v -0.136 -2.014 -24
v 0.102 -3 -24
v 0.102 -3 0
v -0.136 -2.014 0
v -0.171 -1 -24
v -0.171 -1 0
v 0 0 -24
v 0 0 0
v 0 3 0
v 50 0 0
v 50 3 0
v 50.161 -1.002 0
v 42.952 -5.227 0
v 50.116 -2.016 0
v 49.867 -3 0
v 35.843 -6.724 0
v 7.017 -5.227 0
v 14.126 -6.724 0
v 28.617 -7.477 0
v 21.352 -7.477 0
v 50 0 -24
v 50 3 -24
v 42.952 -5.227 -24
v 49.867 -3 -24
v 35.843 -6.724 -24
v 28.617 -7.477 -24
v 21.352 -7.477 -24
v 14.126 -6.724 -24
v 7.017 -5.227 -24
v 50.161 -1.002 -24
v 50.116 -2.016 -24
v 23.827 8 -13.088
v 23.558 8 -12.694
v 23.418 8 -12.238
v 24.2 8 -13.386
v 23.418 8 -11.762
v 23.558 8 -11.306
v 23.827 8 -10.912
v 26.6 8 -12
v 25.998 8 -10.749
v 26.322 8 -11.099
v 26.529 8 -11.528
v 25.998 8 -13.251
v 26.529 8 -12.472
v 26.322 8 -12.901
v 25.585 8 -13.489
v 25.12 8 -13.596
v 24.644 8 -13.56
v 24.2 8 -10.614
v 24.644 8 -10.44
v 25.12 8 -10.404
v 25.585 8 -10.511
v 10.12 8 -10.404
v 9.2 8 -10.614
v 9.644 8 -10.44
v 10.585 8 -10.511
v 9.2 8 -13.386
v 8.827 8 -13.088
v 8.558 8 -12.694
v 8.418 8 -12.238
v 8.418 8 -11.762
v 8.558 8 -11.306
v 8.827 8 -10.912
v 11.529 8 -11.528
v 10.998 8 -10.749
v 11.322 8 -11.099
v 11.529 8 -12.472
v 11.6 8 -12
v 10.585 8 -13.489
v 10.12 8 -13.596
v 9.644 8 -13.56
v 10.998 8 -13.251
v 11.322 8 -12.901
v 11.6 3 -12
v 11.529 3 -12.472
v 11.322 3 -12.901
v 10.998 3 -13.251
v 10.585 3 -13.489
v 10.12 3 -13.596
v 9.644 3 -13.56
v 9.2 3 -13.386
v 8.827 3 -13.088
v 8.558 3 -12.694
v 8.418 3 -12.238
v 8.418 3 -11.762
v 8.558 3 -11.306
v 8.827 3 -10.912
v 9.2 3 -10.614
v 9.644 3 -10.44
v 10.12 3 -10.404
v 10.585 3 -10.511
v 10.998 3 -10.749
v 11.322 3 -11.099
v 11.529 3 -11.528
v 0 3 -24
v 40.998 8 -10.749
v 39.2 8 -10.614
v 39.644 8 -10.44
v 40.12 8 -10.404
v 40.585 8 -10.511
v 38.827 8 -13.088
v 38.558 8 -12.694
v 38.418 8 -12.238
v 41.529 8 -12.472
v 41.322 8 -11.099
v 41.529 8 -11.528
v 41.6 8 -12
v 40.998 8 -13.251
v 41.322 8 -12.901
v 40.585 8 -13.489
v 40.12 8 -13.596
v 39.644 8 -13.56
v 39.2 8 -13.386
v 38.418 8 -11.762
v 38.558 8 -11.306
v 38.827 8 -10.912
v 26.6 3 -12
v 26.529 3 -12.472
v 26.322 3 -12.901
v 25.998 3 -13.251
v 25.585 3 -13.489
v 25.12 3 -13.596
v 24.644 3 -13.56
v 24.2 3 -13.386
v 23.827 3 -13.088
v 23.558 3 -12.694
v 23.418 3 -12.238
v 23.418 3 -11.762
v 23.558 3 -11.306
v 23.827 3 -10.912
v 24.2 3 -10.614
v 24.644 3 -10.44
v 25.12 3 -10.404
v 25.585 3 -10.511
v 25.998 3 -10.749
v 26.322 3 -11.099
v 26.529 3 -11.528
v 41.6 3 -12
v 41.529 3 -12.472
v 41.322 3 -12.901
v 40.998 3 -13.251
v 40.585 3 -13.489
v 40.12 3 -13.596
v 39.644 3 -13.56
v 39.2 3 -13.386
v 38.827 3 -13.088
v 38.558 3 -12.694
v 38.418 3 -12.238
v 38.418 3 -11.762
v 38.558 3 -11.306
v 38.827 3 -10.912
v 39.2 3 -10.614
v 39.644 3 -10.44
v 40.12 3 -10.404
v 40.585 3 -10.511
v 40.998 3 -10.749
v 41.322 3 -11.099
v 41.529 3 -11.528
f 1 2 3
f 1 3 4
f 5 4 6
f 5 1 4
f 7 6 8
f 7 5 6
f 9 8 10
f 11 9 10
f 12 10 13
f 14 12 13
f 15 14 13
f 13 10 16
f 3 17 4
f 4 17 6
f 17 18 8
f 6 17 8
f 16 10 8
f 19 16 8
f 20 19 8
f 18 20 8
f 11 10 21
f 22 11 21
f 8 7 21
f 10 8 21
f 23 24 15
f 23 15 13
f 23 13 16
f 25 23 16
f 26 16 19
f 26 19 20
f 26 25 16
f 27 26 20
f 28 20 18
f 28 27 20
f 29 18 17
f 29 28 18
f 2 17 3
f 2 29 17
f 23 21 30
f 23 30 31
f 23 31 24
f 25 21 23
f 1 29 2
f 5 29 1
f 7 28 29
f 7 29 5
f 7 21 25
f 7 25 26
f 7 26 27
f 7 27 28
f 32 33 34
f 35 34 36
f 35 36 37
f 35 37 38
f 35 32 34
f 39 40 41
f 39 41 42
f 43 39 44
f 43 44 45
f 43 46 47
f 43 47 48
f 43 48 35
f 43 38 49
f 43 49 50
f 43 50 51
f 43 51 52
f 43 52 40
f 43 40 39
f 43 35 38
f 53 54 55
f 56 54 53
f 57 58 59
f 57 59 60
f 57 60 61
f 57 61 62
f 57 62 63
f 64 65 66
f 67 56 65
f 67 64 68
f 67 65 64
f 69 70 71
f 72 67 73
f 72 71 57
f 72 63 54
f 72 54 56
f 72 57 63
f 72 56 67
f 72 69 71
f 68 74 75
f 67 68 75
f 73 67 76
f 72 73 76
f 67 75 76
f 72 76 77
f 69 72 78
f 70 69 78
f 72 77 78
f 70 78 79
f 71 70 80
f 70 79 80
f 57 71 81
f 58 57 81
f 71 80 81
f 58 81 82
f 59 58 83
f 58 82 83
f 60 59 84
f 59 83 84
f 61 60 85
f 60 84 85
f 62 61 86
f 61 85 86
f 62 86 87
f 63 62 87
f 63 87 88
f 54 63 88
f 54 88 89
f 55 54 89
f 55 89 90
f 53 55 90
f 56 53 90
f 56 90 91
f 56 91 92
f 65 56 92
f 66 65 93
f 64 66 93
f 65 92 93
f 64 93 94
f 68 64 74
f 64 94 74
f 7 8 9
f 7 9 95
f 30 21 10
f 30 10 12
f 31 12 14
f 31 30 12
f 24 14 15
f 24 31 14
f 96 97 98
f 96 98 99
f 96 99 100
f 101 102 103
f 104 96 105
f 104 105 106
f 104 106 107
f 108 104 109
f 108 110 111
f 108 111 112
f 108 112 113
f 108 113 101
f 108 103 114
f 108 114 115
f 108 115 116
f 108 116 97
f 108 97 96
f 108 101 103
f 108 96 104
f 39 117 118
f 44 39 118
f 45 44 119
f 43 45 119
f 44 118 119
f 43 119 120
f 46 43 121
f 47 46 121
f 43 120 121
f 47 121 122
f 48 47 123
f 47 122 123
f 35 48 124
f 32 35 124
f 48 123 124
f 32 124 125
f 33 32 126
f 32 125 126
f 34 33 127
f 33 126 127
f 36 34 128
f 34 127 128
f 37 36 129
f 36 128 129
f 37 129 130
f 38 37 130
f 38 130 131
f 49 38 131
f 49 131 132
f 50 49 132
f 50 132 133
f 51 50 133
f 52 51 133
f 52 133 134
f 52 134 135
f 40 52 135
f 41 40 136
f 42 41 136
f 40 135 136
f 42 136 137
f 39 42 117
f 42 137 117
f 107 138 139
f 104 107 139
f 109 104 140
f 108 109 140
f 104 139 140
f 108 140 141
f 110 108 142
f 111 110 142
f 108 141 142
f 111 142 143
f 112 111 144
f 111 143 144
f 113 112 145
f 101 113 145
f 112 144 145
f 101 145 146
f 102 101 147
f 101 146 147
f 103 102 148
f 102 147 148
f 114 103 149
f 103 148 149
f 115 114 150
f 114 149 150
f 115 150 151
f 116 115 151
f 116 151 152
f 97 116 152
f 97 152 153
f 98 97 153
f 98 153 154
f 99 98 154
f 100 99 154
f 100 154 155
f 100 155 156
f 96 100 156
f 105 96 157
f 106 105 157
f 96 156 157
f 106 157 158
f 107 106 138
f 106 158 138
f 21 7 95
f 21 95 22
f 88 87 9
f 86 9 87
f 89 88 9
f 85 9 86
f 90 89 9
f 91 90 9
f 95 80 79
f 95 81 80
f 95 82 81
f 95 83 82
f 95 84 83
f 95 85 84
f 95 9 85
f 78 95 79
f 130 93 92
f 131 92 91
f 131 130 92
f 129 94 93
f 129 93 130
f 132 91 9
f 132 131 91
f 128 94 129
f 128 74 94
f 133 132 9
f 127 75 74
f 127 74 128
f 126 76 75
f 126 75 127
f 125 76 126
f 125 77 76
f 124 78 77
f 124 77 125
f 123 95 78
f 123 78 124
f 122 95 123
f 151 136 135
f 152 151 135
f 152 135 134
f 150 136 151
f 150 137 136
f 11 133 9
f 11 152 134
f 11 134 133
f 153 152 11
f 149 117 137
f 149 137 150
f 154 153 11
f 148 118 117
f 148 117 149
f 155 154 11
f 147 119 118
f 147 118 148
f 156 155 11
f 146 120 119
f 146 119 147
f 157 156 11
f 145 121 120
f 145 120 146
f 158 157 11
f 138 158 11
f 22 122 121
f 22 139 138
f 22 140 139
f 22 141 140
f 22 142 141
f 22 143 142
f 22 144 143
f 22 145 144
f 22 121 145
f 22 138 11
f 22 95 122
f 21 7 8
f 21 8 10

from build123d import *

# Parameters (mm, degrees)
SKETCH1_W           = 50
SKETCH1_H           = 24
BOSS_EXTRUDE1_DEPTH = 3
SKETCH2_R           = 1.6
BOSS_EXTRUDE2_DEPTH = 5
BOSS_EXTRUDE3_DEPTH = 24


with BuildPart() as part:
    # Sketch1 → Boss-Extrude1 (new body)
    with BuildSketch(Plane(origin=(0, 0, 0), x_dir=(1, 0, 0), z_dir=(0, 1, 0))):
        with Locations((25, 12)):
            Rectangle(SKETCH1_W, SKETCH1_H)
    extrude(amount=BOSS_EXTRUDE1_DEPTH)

    # Sketch2 → Boss-Extrude2 (add)
    with BuildSketch(Plane(origin=(0, 3, 0), x_dir=(1, 0, 0), z_dir=(0, 1, 0))):
        with Locations((10, 12)):
            Circle(SKETCH2_R)
        with Locations((25, 12)):
            Circle(SKETCH2_R)
        with Locations((40, 12)):
            Circle(SKETCH2_R)
    extrude(amount=BOSS_EXTRUDE2_DEPTH)


with BuildPart() as body_2:
    # Sketch4 → Boss-Extrude3 (new body)
    with BuildSketch(Plane(origin=(0, 0, -24), x_dir=(-1, 0, 0), z_dir=(0, 0, -1))):
        with BuildLine():
            Line((0, 0), (-50, 0))
            ThreePointArc((-50, 0), (-50.164079249, -1.510214747), (-49.867076753, -3))
            ThreePointArc((-49.867076753, -3), (-24.984514614, -7.571733162), (-0.101952476, -3))
            ThreePointArc((-0.101952476, -3), (0.179467134, -1.507831424), (0, 0))
        make_face()
    extrude(amount=-BOSS_EXTRUDE3_DEPTH)


solid = Compound([part.part, body_2.part])
